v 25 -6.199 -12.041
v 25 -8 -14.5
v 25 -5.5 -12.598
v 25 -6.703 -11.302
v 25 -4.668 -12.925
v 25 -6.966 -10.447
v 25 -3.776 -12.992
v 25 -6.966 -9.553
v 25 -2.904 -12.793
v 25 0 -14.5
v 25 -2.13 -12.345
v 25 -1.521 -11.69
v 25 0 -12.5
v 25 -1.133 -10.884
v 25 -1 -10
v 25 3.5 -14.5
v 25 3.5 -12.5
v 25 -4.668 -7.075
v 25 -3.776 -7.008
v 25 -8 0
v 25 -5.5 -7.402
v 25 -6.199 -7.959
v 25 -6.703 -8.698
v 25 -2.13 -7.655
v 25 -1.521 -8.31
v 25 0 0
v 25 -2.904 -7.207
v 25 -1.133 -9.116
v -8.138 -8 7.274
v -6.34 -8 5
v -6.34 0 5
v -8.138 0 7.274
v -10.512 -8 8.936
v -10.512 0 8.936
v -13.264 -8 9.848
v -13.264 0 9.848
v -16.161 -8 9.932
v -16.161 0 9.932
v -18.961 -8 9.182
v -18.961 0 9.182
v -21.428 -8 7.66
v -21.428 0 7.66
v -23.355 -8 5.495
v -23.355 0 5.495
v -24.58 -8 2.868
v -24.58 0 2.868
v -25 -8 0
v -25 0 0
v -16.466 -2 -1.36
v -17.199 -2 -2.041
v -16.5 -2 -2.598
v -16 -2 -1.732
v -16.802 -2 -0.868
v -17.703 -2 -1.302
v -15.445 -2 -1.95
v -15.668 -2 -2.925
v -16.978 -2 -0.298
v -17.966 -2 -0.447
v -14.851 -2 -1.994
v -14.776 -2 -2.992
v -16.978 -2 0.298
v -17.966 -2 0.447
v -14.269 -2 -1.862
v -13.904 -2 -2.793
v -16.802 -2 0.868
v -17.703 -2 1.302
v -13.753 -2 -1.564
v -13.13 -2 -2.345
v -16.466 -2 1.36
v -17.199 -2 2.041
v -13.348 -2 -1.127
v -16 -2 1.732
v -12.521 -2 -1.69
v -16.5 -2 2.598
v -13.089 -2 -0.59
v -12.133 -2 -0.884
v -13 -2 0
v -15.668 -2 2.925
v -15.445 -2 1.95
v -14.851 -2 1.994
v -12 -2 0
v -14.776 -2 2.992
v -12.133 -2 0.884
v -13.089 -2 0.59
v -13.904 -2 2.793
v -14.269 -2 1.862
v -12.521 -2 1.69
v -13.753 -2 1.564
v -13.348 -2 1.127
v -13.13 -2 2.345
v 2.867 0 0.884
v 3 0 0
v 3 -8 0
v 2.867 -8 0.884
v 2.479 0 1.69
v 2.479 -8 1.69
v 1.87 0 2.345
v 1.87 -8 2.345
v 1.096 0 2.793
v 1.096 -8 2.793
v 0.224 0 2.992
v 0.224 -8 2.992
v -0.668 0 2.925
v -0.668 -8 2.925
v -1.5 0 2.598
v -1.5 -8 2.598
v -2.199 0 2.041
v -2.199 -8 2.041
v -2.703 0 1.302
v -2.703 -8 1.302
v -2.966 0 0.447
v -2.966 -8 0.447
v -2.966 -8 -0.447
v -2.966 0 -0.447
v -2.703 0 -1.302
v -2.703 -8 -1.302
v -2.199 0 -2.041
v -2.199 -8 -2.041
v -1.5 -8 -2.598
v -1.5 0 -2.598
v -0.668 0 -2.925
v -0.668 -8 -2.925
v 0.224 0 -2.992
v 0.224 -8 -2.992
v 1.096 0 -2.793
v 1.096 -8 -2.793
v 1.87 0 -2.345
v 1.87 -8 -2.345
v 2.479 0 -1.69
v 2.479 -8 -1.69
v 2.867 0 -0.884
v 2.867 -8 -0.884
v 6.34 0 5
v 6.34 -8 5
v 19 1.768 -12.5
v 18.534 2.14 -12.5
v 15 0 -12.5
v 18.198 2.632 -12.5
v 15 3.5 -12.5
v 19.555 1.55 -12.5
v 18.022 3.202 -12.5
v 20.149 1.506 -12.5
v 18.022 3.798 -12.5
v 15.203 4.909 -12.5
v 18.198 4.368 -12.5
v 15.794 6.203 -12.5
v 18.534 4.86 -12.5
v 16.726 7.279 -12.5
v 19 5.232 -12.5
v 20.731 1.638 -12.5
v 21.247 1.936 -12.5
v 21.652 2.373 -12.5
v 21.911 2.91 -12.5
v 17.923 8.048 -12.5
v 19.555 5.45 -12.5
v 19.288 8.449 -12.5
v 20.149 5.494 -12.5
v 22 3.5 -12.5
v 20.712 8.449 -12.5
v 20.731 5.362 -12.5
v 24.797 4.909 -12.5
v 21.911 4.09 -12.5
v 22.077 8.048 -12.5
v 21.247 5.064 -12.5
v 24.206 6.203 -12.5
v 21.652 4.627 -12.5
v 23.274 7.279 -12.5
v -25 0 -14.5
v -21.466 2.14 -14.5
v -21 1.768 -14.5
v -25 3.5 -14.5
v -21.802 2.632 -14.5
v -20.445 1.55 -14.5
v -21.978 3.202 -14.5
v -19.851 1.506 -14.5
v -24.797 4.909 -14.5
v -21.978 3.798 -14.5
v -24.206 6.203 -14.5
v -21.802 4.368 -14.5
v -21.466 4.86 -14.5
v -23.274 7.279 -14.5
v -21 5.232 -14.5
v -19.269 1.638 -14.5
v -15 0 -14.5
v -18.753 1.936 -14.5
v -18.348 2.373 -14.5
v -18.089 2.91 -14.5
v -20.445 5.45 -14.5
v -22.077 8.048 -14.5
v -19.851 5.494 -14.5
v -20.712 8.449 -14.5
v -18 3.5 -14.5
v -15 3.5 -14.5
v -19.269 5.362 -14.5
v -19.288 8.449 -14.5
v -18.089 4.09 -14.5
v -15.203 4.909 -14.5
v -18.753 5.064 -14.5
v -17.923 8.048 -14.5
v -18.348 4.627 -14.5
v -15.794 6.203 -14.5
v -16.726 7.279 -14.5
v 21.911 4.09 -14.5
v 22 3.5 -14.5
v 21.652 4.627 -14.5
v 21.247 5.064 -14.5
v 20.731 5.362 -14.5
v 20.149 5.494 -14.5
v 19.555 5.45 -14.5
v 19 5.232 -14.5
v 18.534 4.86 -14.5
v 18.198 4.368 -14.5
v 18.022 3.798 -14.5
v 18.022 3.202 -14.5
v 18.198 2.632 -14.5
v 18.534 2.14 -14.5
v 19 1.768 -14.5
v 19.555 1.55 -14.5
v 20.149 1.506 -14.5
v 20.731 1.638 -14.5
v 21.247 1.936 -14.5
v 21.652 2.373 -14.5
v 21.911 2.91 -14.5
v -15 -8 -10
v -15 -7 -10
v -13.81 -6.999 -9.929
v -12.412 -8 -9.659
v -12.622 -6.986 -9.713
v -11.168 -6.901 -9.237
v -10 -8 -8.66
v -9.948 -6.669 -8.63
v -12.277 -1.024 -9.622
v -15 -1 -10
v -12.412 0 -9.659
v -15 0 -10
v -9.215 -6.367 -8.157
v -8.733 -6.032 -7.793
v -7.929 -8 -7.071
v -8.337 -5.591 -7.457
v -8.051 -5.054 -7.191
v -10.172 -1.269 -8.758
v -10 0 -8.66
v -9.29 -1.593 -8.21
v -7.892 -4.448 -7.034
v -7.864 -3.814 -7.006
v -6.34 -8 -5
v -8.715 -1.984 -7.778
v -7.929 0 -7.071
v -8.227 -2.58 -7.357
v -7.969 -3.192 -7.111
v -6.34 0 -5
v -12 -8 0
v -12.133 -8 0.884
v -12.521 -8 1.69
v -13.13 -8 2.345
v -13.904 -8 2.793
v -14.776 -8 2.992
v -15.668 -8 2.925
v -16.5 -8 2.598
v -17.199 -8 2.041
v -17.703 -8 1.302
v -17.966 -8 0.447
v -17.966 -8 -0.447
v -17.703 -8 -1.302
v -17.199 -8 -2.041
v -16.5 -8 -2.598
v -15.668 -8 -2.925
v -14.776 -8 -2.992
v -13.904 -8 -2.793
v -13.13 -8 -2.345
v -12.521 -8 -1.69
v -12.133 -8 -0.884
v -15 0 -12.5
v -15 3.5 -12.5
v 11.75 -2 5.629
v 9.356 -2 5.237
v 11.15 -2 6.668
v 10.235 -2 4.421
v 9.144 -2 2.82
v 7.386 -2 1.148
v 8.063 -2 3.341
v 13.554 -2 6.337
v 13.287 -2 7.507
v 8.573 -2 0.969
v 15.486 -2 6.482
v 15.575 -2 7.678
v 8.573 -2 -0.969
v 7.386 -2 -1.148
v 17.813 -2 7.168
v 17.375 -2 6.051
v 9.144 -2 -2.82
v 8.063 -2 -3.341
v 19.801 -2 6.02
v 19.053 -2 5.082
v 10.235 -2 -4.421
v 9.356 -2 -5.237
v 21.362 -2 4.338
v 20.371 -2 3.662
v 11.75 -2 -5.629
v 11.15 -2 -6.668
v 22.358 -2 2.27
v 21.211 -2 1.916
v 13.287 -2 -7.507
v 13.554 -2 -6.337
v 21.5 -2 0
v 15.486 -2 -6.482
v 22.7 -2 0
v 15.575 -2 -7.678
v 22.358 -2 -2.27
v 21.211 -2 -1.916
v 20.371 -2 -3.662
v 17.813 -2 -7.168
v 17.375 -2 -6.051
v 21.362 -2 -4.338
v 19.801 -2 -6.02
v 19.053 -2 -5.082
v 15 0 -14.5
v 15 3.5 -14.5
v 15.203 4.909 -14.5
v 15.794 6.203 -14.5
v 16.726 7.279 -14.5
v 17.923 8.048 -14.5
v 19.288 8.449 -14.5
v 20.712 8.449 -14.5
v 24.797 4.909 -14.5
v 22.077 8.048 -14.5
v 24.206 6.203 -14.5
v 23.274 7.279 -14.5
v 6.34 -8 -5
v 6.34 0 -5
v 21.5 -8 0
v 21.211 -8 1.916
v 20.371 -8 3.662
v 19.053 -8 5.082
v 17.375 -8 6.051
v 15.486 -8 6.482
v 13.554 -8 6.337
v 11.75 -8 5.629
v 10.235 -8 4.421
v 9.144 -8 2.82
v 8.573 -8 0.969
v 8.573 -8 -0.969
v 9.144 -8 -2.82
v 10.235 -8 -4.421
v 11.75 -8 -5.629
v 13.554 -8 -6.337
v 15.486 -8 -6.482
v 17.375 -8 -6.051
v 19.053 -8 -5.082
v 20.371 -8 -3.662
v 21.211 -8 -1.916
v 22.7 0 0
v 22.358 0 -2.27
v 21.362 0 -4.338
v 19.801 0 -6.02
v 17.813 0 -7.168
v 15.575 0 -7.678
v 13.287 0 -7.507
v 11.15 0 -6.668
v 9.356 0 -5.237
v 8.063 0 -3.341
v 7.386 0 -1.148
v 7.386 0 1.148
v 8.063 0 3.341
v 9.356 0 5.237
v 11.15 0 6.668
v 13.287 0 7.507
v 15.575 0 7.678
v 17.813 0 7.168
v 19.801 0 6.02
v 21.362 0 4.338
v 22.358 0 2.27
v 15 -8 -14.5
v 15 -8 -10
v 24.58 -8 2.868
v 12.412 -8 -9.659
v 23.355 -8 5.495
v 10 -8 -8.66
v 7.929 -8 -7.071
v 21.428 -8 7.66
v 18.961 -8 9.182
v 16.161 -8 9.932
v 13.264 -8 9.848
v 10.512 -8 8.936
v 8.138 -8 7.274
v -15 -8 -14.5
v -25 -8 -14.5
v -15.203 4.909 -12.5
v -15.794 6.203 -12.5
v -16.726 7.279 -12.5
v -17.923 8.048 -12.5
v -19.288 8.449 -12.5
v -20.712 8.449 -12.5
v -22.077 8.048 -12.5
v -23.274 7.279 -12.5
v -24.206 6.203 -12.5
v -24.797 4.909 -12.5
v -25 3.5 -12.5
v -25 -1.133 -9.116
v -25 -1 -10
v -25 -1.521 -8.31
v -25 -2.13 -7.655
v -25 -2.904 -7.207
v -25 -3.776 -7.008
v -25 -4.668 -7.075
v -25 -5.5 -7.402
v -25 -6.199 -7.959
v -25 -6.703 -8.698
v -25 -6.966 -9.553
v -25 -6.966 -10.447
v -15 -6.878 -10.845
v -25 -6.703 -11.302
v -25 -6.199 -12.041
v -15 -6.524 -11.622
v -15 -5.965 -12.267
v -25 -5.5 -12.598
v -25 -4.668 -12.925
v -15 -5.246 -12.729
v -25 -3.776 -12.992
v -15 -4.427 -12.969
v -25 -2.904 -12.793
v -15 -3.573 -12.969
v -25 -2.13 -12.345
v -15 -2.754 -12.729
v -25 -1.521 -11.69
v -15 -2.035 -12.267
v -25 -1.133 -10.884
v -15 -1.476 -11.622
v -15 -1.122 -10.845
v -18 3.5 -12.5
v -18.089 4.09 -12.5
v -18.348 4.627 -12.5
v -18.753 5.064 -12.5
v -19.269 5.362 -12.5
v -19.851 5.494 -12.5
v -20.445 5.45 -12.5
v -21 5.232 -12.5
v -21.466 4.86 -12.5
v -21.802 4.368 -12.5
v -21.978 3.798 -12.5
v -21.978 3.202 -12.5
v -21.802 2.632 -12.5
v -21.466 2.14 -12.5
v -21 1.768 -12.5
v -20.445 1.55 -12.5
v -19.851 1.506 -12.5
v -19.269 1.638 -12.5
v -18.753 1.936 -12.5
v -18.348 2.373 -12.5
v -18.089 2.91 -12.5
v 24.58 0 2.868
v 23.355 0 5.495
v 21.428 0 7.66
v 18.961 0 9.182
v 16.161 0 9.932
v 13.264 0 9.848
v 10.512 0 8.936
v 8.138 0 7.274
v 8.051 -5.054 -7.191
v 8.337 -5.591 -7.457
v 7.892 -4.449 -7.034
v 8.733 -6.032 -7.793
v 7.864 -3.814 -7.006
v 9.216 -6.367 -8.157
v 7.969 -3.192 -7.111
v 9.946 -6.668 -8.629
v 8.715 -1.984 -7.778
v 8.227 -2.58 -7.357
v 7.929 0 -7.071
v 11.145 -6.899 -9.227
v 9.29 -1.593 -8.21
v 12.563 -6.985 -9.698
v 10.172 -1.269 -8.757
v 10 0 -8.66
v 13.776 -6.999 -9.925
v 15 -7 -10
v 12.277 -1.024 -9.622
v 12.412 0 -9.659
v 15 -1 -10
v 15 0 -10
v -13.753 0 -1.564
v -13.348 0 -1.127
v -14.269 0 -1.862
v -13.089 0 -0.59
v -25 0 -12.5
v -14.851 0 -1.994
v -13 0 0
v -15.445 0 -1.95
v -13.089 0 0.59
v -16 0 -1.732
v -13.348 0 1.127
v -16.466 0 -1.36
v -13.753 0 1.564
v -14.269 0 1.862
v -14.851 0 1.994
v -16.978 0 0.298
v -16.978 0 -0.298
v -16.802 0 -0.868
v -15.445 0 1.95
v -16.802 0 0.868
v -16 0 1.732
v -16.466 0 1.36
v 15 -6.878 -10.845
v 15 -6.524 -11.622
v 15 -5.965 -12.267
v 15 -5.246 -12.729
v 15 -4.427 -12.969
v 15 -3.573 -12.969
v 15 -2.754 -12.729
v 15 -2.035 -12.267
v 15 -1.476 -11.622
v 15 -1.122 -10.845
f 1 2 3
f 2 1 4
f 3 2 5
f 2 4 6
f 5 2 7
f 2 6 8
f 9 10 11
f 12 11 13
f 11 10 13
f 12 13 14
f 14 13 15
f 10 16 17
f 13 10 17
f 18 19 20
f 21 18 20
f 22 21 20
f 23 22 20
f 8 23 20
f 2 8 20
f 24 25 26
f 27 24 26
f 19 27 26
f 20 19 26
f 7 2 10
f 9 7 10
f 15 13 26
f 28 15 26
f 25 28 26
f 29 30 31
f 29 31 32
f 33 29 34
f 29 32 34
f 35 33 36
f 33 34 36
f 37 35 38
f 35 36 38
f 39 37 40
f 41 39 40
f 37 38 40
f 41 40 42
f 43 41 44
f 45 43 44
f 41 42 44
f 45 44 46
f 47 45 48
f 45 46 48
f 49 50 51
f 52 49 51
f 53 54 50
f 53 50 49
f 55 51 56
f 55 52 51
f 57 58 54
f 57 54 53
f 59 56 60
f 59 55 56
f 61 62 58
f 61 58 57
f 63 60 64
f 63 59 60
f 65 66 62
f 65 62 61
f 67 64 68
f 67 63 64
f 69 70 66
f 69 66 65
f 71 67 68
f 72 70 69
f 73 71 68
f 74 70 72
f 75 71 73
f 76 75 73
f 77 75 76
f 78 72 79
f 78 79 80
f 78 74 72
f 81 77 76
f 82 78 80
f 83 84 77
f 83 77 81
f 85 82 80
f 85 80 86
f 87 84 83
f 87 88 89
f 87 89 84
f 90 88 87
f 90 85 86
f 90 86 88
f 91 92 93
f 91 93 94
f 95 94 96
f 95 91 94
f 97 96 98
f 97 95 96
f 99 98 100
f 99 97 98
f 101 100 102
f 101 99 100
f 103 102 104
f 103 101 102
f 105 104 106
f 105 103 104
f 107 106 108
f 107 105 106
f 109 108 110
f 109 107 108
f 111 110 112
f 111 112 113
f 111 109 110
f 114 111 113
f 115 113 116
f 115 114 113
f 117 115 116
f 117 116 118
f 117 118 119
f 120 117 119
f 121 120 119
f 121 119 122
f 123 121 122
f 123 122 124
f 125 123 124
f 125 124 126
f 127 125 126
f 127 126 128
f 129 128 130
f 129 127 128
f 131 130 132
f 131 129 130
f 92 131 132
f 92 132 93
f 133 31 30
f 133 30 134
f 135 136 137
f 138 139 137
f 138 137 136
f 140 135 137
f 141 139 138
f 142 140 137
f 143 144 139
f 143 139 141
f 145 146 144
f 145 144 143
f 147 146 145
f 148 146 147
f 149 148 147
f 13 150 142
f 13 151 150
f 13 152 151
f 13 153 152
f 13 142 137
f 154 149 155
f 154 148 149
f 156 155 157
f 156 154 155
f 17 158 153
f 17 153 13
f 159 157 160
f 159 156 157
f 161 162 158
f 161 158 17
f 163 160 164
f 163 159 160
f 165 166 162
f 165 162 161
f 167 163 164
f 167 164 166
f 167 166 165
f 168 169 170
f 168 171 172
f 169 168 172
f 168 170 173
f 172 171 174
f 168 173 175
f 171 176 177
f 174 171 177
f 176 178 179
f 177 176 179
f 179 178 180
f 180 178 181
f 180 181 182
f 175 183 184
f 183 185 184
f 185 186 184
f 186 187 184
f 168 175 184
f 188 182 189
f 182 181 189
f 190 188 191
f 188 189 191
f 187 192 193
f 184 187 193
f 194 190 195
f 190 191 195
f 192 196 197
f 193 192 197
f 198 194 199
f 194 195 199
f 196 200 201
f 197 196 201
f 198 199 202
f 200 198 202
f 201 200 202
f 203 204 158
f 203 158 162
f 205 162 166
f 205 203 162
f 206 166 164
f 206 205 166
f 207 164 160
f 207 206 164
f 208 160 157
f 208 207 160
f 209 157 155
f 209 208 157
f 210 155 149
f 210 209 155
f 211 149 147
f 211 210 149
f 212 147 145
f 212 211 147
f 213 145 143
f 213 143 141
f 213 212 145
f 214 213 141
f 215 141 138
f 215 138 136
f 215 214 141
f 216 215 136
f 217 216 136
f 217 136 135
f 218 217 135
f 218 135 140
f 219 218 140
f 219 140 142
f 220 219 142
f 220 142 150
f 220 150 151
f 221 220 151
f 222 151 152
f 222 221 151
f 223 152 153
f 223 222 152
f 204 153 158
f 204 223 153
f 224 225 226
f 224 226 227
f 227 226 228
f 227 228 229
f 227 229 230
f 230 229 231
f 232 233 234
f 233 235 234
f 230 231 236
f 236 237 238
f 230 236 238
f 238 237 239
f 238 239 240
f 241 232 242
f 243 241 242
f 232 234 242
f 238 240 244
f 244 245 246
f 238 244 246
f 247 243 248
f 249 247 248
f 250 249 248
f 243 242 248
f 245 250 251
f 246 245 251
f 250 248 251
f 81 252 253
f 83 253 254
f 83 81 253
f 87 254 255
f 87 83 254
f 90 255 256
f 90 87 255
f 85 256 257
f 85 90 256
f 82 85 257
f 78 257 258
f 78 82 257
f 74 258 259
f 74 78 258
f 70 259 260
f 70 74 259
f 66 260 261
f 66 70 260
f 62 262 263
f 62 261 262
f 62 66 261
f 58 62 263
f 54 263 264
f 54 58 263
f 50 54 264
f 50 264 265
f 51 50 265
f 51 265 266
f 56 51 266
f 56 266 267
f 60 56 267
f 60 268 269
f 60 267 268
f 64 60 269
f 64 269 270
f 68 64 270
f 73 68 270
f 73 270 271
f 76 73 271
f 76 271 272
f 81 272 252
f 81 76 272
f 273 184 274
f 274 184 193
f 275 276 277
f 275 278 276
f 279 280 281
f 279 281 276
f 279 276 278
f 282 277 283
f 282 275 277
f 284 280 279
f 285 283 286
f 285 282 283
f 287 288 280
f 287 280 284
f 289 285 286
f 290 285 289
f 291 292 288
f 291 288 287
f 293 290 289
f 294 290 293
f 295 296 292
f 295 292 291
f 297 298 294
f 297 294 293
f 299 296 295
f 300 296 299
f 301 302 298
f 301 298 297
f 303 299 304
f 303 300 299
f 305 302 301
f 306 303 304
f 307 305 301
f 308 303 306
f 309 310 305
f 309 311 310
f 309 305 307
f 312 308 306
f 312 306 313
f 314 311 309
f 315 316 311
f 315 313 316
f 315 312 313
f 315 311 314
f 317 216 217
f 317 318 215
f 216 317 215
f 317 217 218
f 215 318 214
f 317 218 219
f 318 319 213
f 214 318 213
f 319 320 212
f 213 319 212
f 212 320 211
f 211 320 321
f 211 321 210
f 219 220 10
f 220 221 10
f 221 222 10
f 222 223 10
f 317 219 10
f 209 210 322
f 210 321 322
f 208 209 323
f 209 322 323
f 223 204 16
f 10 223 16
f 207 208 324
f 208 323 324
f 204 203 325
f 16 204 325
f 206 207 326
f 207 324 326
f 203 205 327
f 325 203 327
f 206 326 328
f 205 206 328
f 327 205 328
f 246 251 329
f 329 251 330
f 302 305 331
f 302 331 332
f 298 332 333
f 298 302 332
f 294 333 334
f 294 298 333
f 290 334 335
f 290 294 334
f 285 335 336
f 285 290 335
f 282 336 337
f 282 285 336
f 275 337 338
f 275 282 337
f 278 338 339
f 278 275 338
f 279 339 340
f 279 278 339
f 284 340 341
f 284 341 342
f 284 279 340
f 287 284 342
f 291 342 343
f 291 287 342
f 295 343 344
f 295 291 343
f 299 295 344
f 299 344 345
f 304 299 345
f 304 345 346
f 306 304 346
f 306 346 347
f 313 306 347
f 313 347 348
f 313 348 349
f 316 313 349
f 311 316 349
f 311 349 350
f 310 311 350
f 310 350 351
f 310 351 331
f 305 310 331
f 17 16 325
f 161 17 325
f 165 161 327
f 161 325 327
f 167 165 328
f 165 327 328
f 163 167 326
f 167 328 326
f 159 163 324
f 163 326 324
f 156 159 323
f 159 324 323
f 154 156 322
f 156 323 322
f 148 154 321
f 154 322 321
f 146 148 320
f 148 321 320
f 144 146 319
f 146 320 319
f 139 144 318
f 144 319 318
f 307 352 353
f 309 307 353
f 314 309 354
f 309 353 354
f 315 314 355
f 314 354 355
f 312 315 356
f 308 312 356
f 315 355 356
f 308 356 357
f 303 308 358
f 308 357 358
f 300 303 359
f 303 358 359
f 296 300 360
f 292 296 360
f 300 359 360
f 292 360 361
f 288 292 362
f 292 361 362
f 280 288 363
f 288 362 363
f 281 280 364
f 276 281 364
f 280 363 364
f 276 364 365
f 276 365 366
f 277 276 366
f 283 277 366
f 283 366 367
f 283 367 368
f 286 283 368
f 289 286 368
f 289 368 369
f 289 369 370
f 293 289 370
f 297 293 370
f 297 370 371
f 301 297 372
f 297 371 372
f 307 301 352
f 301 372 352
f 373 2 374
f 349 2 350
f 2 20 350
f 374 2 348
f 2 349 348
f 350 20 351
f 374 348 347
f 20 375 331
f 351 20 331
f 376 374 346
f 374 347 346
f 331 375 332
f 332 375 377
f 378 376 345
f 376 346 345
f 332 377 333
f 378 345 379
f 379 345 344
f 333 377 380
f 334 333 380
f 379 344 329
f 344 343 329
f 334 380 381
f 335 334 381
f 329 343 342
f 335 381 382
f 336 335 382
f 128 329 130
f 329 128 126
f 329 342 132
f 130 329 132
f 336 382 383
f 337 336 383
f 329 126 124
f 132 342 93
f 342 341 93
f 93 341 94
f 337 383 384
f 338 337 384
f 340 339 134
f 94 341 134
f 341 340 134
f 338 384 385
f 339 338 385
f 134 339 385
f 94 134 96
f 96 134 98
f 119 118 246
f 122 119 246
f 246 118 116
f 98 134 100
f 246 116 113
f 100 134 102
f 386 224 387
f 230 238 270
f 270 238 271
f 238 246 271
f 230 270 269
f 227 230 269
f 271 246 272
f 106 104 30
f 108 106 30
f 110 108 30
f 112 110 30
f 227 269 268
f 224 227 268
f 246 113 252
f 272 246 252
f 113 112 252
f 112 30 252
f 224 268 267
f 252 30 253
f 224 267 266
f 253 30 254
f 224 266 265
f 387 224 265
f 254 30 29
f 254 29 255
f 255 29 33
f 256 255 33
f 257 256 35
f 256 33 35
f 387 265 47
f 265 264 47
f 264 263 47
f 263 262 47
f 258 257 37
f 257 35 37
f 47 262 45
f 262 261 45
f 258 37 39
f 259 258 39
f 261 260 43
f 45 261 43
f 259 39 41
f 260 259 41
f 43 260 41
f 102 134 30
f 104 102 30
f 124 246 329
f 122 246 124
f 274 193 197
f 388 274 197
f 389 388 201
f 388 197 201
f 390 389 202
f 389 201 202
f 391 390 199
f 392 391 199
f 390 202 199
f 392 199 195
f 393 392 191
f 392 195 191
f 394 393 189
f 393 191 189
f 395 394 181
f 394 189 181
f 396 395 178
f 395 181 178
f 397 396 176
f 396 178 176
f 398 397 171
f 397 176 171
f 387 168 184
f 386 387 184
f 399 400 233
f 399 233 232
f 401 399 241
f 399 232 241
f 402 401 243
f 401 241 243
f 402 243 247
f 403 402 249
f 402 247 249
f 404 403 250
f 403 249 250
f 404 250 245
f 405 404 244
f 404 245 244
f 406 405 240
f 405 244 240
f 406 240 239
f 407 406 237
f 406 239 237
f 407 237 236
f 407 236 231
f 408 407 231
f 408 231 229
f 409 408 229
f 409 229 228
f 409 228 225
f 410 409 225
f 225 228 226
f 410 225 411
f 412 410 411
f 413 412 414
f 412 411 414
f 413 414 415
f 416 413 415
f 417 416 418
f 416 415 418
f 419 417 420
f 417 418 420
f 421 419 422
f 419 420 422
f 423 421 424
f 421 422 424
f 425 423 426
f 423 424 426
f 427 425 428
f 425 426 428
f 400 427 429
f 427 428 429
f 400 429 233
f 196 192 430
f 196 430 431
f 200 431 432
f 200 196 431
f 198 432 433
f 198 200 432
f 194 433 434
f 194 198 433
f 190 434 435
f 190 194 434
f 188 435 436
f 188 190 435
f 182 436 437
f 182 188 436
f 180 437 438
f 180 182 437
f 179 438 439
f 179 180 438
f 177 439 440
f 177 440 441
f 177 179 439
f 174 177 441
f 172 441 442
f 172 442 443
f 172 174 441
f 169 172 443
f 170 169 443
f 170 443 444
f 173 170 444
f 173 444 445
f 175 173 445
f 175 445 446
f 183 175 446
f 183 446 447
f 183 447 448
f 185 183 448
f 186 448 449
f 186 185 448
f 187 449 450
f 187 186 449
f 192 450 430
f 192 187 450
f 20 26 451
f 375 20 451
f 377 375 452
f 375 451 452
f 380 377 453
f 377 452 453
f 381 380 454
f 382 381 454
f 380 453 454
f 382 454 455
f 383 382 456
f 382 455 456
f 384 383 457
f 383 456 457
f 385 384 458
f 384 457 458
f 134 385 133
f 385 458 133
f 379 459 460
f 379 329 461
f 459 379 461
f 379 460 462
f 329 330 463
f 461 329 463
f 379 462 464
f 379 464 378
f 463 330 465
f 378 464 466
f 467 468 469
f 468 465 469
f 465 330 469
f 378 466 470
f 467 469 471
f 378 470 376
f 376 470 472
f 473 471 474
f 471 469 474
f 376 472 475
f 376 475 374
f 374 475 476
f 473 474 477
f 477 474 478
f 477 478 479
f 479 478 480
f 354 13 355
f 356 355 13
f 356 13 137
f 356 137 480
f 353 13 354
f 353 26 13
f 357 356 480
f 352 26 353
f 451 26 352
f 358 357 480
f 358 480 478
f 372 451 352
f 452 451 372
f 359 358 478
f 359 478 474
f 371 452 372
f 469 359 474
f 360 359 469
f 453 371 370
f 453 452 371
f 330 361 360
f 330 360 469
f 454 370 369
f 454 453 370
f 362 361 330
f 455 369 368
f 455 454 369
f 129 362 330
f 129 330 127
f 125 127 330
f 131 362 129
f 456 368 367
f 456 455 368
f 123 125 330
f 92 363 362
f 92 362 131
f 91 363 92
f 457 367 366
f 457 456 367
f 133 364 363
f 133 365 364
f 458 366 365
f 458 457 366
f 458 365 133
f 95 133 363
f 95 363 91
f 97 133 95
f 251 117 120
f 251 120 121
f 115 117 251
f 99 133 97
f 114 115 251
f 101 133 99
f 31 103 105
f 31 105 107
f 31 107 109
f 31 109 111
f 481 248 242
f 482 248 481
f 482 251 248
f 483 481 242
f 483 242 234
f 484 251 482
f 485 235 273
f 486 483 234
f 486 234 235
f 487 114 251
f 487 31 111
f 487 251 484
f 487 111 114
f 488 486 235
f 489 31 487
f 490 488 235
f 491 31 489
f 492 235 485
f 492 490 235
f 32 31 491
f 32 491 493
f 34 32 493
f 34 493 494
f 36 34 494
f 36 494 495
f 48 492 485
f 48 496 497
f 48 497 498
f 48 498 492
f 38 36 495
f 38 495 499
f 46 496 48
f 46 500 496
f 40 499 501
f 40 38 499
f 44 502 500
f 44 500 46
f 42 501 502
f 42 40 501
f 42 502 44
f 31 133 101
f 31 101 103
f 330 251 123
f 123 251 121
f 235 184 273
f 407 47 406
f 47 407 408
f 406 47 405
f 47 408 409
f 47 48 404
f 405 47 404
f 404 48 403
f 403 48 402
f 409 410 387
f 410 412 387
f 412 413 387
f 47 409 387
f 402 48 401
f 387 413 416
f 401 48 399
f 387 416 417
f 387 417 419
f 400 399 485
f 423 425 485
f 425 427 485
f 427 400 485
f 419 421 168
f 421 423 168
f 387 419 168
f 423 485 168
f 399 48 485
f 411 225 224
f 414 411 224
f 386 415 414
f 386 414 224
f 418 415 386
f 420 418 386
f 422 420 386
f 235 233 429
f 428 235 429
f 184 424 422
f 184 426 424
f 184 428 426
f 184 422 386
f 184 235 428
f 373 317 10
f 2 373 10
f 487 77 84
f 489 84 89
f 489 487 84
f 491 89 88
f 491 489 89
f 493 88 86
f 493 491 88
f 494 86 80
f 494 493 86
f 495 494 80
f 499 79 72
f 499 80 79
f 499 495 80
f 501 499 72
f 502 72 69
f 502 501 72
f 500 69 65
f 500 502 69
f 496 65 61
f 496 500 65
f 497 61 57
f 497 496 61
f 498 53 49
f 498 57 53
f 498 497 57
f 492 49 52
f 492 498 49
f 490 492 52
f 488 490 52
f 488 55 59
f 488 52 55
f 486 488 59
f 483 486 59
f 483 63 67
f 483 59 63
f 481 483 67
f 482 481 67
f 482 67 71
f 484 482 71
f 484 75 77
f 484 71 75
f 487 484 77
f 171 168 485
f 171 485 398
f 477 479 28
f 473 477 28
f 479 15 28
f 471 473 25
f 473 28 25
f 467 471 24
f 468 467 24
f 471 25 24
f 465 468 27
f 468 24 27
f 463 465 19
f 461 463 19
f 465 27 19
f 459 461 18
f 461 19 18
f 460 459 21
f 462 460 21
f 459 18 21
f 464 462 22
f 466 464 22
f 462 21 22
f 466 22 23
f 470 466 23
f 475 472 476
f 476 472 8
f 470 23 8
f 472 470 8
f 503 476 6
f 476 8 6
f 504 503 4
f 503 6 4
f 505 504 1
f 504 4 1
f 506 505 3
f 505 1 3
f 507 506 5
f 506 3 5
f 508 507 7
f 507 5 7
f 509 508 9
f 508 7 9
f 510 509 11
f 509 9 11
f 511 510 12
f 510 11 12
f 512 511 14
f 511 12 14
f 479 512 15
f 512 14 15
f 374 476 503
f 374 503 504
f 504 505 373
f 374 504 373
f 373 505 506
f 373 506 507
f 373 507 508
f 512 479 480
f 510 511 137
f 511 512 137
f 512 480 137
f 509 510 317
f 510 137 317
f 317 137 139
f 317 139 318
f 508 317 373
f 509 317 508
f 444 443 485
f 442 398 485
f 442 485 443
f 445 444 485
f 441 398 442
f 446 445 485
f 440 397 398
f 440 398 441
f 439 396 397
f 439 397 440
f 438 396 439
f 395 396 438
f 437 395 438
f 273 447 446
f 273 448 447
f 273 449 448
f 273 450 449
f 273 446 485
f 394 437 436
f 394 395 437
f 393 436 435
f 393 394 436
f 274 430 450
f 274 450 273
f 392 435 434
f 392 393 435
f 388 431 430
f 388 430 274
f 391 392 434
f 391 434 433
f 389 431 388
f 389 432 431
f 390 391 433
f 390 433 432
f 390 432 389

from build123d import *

# Parameters (mm, degrees)
SKETCH002_R     = 2
SKETCH002_R_2   = 6.5
SKETCH002_R_3   = 3
PAD_DEPTH       = 8
SKETCH003_R     = 7.7
POCKET_DEPTH    = 2
SKETCH004_R     = 3
POCKET001_DEPTH = 31
SKETCH005_R     = 2
PAD001_DEPTH    = 2
SKETCH007_R     = 3
POCKET002_DEPTH = 11


with BuildPart() as part:
    # Sketch002 → Pad (new body)
    with BuildSketch(Plane.XZ):
        with BuildLine():
            Line((-6.339749, 5.000001), (6.339746, 5.000001))
            ThreePointArc((25.000002, 0), (17.588192, 9.659262), (6.339746, 5.000001))
            Line((25.000002, -14.499996), (25.000002, 0))
            Line((15.000002, -14.499996), (25.000002, -14.499996))
            Line((15.000002, -9.999996), (15.000002, -14.499996))
            ThreePointArc((6.339751, -5.000001), (10.000004, -8.660251), (15.000002, -9.999996))
            Line((-6.339746, -5.000001), (6.339751, -5.000001))
            ThreePointArc((-15, -10), (-10, -8.660255), (-6.339746, -5.000001))
            Line((-15, -10), (-15, -14.499996))
            Line((-25, -14.499996), (-15, -14.499996))
            Line((-25, 0), (-25, -14.499996))
            ThreePointArc((-6.339749, 5.000001), (-17.588192, 9.659257), (-25, 0))
        make_face()
        with Locations((-15, 0)):
            Circle(SKETCH002_R, mode=Mode.SUBTRACT)
        with Locations((15.000002, 4e-06)):
            Circle(SKETCH002_R_2, mode=Mode.SUBTRACT)
        Circle(SKETCH002_R_3, mode=Mode.SUBTRACT)
    extrude(amount=PAD_DEPTH)

    # Sketch003 (on Face16 of Pad) → Pocket (cut)
    with BuildSketch(Plane(origin=(0, 0, 0), x_dir=(1, 0, 0), z_dir=(0, 1, 0))):
        with Locations((15.000002, -4e-06)):
            Circle(SKETCH003_R)
    extrude(amount=-POCKET_DEPTH, mode=Mode.SUBTRACT)

    # Sketch004 → Pocket001 (cut, symmetric)
    with BuildSketch(Plane.YZ):
        with Locations((-4, -10)):
            Circle(SKETCH004_R)
    extrude(amount=POCKET001_DEPTH, both=True, mode=Mode.SUBTRACT)

    # Sketch005 → Pad001 (join)
    with BuildSketch(Plane.XY.offset(-14.5)):
        with BuildLine():
            Line((-25.000002, 0), (-15.000002, 0))
            Line((-15.000002, 0), (-15.000002, 3.5))
            ThreePointArc((-15.000002, 3.5), (-20.000002, 8.5), (-25.000002, 3.5))
            Line((-25.000002, 0), (-25.000002, 3.5))
        make_face()
        with Locations((-20.000002, 3.5)):
            Circle(SKETCH005_R, mode=Mode.SUBTRACT)
        with BuildLine():
            Line((15.000002, 0), (25.000002, 0))
            Line((25.000002, 0), (25.000002, 3.5))
            ThreePointArc((25.000002, 3.5), (20.000002, 8.5), (15.000002, 3.5))
            Line((15.000002, 0), (15.000002, 3.5))
        make_face()
        with Locations((20.000002, 3.5)):
            Circle(SKETCH005_R, mode=Mode.SUBTRACT)
    extrude(amount=PAD001_DEPTH)

    # Sketch007 → Pocket002 (cut)
    with BuildSketch(Plane.XZ.offset(2)):
        with Locations((-15, 0)):
            Circle(SKETCH007_R)
    extrude(amount=POCKET002_DEPTH, mode=Mode.SUBTRACT)


solid = part.part
